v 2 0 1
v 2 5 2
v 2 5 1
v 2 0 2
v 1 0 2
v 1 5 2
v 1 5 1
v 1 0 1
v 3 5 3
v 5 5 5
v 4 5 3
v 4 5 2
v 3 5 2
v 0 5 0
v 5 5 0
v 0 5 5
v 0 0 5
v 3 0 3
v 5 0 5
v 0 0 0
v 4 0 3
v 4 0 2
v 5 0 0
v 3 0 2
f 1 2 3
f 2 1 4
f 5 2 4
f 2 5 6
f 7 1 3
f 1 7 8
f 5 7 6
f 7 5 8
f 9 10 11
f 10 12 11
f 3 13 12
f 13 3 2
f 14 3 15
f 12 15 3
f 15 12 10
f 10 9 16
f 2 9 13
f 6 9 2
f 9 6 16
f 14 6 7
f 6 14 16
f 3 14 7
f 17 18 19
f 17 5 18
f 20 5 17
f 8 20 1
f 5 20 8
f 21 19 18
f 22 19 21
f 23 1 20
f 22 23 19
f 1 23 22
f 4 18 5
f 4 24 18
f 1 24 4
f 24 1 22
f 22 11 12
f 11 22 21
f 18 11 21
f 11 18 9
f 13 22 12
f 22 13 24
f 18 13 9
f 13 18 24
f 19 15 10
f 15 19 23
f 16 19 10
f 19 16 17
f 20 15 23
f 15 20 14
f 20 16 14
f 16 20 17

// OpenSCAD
difference() {
  translate([2.5000000000, 2.5000000000, 2.5000000000]) {
    scale([5.0000000000, 5.0000000000, 5.0000000000]) {
      translate([-0.5000000000, -0.5000000000, -0.5000000000]) {
        cube([1, 1, 1]);
      }
    }
  }
  union() {
    translate([1.5000000000, 2.5000000000, 1.5000000000]) {
      scale([1.0000000000, 5.0000000000, 1.0000000000]) {
        translate([-0.5000000000, -0.5000000000, -0.5000000000]) {
          cube([1, 1, 1]);
        }
      }
    }
    translate([3.5000000000, 2.5000000000, 2.5000000000]) {
      scale([1.0000000000, 5.0000000000, 1.0000000000]) {
        translate([-0.5000000000, -0.5000000000, -0.5000000000]) {
          cube([1, 1, 1]);
        }
      }
    }
  }
}
